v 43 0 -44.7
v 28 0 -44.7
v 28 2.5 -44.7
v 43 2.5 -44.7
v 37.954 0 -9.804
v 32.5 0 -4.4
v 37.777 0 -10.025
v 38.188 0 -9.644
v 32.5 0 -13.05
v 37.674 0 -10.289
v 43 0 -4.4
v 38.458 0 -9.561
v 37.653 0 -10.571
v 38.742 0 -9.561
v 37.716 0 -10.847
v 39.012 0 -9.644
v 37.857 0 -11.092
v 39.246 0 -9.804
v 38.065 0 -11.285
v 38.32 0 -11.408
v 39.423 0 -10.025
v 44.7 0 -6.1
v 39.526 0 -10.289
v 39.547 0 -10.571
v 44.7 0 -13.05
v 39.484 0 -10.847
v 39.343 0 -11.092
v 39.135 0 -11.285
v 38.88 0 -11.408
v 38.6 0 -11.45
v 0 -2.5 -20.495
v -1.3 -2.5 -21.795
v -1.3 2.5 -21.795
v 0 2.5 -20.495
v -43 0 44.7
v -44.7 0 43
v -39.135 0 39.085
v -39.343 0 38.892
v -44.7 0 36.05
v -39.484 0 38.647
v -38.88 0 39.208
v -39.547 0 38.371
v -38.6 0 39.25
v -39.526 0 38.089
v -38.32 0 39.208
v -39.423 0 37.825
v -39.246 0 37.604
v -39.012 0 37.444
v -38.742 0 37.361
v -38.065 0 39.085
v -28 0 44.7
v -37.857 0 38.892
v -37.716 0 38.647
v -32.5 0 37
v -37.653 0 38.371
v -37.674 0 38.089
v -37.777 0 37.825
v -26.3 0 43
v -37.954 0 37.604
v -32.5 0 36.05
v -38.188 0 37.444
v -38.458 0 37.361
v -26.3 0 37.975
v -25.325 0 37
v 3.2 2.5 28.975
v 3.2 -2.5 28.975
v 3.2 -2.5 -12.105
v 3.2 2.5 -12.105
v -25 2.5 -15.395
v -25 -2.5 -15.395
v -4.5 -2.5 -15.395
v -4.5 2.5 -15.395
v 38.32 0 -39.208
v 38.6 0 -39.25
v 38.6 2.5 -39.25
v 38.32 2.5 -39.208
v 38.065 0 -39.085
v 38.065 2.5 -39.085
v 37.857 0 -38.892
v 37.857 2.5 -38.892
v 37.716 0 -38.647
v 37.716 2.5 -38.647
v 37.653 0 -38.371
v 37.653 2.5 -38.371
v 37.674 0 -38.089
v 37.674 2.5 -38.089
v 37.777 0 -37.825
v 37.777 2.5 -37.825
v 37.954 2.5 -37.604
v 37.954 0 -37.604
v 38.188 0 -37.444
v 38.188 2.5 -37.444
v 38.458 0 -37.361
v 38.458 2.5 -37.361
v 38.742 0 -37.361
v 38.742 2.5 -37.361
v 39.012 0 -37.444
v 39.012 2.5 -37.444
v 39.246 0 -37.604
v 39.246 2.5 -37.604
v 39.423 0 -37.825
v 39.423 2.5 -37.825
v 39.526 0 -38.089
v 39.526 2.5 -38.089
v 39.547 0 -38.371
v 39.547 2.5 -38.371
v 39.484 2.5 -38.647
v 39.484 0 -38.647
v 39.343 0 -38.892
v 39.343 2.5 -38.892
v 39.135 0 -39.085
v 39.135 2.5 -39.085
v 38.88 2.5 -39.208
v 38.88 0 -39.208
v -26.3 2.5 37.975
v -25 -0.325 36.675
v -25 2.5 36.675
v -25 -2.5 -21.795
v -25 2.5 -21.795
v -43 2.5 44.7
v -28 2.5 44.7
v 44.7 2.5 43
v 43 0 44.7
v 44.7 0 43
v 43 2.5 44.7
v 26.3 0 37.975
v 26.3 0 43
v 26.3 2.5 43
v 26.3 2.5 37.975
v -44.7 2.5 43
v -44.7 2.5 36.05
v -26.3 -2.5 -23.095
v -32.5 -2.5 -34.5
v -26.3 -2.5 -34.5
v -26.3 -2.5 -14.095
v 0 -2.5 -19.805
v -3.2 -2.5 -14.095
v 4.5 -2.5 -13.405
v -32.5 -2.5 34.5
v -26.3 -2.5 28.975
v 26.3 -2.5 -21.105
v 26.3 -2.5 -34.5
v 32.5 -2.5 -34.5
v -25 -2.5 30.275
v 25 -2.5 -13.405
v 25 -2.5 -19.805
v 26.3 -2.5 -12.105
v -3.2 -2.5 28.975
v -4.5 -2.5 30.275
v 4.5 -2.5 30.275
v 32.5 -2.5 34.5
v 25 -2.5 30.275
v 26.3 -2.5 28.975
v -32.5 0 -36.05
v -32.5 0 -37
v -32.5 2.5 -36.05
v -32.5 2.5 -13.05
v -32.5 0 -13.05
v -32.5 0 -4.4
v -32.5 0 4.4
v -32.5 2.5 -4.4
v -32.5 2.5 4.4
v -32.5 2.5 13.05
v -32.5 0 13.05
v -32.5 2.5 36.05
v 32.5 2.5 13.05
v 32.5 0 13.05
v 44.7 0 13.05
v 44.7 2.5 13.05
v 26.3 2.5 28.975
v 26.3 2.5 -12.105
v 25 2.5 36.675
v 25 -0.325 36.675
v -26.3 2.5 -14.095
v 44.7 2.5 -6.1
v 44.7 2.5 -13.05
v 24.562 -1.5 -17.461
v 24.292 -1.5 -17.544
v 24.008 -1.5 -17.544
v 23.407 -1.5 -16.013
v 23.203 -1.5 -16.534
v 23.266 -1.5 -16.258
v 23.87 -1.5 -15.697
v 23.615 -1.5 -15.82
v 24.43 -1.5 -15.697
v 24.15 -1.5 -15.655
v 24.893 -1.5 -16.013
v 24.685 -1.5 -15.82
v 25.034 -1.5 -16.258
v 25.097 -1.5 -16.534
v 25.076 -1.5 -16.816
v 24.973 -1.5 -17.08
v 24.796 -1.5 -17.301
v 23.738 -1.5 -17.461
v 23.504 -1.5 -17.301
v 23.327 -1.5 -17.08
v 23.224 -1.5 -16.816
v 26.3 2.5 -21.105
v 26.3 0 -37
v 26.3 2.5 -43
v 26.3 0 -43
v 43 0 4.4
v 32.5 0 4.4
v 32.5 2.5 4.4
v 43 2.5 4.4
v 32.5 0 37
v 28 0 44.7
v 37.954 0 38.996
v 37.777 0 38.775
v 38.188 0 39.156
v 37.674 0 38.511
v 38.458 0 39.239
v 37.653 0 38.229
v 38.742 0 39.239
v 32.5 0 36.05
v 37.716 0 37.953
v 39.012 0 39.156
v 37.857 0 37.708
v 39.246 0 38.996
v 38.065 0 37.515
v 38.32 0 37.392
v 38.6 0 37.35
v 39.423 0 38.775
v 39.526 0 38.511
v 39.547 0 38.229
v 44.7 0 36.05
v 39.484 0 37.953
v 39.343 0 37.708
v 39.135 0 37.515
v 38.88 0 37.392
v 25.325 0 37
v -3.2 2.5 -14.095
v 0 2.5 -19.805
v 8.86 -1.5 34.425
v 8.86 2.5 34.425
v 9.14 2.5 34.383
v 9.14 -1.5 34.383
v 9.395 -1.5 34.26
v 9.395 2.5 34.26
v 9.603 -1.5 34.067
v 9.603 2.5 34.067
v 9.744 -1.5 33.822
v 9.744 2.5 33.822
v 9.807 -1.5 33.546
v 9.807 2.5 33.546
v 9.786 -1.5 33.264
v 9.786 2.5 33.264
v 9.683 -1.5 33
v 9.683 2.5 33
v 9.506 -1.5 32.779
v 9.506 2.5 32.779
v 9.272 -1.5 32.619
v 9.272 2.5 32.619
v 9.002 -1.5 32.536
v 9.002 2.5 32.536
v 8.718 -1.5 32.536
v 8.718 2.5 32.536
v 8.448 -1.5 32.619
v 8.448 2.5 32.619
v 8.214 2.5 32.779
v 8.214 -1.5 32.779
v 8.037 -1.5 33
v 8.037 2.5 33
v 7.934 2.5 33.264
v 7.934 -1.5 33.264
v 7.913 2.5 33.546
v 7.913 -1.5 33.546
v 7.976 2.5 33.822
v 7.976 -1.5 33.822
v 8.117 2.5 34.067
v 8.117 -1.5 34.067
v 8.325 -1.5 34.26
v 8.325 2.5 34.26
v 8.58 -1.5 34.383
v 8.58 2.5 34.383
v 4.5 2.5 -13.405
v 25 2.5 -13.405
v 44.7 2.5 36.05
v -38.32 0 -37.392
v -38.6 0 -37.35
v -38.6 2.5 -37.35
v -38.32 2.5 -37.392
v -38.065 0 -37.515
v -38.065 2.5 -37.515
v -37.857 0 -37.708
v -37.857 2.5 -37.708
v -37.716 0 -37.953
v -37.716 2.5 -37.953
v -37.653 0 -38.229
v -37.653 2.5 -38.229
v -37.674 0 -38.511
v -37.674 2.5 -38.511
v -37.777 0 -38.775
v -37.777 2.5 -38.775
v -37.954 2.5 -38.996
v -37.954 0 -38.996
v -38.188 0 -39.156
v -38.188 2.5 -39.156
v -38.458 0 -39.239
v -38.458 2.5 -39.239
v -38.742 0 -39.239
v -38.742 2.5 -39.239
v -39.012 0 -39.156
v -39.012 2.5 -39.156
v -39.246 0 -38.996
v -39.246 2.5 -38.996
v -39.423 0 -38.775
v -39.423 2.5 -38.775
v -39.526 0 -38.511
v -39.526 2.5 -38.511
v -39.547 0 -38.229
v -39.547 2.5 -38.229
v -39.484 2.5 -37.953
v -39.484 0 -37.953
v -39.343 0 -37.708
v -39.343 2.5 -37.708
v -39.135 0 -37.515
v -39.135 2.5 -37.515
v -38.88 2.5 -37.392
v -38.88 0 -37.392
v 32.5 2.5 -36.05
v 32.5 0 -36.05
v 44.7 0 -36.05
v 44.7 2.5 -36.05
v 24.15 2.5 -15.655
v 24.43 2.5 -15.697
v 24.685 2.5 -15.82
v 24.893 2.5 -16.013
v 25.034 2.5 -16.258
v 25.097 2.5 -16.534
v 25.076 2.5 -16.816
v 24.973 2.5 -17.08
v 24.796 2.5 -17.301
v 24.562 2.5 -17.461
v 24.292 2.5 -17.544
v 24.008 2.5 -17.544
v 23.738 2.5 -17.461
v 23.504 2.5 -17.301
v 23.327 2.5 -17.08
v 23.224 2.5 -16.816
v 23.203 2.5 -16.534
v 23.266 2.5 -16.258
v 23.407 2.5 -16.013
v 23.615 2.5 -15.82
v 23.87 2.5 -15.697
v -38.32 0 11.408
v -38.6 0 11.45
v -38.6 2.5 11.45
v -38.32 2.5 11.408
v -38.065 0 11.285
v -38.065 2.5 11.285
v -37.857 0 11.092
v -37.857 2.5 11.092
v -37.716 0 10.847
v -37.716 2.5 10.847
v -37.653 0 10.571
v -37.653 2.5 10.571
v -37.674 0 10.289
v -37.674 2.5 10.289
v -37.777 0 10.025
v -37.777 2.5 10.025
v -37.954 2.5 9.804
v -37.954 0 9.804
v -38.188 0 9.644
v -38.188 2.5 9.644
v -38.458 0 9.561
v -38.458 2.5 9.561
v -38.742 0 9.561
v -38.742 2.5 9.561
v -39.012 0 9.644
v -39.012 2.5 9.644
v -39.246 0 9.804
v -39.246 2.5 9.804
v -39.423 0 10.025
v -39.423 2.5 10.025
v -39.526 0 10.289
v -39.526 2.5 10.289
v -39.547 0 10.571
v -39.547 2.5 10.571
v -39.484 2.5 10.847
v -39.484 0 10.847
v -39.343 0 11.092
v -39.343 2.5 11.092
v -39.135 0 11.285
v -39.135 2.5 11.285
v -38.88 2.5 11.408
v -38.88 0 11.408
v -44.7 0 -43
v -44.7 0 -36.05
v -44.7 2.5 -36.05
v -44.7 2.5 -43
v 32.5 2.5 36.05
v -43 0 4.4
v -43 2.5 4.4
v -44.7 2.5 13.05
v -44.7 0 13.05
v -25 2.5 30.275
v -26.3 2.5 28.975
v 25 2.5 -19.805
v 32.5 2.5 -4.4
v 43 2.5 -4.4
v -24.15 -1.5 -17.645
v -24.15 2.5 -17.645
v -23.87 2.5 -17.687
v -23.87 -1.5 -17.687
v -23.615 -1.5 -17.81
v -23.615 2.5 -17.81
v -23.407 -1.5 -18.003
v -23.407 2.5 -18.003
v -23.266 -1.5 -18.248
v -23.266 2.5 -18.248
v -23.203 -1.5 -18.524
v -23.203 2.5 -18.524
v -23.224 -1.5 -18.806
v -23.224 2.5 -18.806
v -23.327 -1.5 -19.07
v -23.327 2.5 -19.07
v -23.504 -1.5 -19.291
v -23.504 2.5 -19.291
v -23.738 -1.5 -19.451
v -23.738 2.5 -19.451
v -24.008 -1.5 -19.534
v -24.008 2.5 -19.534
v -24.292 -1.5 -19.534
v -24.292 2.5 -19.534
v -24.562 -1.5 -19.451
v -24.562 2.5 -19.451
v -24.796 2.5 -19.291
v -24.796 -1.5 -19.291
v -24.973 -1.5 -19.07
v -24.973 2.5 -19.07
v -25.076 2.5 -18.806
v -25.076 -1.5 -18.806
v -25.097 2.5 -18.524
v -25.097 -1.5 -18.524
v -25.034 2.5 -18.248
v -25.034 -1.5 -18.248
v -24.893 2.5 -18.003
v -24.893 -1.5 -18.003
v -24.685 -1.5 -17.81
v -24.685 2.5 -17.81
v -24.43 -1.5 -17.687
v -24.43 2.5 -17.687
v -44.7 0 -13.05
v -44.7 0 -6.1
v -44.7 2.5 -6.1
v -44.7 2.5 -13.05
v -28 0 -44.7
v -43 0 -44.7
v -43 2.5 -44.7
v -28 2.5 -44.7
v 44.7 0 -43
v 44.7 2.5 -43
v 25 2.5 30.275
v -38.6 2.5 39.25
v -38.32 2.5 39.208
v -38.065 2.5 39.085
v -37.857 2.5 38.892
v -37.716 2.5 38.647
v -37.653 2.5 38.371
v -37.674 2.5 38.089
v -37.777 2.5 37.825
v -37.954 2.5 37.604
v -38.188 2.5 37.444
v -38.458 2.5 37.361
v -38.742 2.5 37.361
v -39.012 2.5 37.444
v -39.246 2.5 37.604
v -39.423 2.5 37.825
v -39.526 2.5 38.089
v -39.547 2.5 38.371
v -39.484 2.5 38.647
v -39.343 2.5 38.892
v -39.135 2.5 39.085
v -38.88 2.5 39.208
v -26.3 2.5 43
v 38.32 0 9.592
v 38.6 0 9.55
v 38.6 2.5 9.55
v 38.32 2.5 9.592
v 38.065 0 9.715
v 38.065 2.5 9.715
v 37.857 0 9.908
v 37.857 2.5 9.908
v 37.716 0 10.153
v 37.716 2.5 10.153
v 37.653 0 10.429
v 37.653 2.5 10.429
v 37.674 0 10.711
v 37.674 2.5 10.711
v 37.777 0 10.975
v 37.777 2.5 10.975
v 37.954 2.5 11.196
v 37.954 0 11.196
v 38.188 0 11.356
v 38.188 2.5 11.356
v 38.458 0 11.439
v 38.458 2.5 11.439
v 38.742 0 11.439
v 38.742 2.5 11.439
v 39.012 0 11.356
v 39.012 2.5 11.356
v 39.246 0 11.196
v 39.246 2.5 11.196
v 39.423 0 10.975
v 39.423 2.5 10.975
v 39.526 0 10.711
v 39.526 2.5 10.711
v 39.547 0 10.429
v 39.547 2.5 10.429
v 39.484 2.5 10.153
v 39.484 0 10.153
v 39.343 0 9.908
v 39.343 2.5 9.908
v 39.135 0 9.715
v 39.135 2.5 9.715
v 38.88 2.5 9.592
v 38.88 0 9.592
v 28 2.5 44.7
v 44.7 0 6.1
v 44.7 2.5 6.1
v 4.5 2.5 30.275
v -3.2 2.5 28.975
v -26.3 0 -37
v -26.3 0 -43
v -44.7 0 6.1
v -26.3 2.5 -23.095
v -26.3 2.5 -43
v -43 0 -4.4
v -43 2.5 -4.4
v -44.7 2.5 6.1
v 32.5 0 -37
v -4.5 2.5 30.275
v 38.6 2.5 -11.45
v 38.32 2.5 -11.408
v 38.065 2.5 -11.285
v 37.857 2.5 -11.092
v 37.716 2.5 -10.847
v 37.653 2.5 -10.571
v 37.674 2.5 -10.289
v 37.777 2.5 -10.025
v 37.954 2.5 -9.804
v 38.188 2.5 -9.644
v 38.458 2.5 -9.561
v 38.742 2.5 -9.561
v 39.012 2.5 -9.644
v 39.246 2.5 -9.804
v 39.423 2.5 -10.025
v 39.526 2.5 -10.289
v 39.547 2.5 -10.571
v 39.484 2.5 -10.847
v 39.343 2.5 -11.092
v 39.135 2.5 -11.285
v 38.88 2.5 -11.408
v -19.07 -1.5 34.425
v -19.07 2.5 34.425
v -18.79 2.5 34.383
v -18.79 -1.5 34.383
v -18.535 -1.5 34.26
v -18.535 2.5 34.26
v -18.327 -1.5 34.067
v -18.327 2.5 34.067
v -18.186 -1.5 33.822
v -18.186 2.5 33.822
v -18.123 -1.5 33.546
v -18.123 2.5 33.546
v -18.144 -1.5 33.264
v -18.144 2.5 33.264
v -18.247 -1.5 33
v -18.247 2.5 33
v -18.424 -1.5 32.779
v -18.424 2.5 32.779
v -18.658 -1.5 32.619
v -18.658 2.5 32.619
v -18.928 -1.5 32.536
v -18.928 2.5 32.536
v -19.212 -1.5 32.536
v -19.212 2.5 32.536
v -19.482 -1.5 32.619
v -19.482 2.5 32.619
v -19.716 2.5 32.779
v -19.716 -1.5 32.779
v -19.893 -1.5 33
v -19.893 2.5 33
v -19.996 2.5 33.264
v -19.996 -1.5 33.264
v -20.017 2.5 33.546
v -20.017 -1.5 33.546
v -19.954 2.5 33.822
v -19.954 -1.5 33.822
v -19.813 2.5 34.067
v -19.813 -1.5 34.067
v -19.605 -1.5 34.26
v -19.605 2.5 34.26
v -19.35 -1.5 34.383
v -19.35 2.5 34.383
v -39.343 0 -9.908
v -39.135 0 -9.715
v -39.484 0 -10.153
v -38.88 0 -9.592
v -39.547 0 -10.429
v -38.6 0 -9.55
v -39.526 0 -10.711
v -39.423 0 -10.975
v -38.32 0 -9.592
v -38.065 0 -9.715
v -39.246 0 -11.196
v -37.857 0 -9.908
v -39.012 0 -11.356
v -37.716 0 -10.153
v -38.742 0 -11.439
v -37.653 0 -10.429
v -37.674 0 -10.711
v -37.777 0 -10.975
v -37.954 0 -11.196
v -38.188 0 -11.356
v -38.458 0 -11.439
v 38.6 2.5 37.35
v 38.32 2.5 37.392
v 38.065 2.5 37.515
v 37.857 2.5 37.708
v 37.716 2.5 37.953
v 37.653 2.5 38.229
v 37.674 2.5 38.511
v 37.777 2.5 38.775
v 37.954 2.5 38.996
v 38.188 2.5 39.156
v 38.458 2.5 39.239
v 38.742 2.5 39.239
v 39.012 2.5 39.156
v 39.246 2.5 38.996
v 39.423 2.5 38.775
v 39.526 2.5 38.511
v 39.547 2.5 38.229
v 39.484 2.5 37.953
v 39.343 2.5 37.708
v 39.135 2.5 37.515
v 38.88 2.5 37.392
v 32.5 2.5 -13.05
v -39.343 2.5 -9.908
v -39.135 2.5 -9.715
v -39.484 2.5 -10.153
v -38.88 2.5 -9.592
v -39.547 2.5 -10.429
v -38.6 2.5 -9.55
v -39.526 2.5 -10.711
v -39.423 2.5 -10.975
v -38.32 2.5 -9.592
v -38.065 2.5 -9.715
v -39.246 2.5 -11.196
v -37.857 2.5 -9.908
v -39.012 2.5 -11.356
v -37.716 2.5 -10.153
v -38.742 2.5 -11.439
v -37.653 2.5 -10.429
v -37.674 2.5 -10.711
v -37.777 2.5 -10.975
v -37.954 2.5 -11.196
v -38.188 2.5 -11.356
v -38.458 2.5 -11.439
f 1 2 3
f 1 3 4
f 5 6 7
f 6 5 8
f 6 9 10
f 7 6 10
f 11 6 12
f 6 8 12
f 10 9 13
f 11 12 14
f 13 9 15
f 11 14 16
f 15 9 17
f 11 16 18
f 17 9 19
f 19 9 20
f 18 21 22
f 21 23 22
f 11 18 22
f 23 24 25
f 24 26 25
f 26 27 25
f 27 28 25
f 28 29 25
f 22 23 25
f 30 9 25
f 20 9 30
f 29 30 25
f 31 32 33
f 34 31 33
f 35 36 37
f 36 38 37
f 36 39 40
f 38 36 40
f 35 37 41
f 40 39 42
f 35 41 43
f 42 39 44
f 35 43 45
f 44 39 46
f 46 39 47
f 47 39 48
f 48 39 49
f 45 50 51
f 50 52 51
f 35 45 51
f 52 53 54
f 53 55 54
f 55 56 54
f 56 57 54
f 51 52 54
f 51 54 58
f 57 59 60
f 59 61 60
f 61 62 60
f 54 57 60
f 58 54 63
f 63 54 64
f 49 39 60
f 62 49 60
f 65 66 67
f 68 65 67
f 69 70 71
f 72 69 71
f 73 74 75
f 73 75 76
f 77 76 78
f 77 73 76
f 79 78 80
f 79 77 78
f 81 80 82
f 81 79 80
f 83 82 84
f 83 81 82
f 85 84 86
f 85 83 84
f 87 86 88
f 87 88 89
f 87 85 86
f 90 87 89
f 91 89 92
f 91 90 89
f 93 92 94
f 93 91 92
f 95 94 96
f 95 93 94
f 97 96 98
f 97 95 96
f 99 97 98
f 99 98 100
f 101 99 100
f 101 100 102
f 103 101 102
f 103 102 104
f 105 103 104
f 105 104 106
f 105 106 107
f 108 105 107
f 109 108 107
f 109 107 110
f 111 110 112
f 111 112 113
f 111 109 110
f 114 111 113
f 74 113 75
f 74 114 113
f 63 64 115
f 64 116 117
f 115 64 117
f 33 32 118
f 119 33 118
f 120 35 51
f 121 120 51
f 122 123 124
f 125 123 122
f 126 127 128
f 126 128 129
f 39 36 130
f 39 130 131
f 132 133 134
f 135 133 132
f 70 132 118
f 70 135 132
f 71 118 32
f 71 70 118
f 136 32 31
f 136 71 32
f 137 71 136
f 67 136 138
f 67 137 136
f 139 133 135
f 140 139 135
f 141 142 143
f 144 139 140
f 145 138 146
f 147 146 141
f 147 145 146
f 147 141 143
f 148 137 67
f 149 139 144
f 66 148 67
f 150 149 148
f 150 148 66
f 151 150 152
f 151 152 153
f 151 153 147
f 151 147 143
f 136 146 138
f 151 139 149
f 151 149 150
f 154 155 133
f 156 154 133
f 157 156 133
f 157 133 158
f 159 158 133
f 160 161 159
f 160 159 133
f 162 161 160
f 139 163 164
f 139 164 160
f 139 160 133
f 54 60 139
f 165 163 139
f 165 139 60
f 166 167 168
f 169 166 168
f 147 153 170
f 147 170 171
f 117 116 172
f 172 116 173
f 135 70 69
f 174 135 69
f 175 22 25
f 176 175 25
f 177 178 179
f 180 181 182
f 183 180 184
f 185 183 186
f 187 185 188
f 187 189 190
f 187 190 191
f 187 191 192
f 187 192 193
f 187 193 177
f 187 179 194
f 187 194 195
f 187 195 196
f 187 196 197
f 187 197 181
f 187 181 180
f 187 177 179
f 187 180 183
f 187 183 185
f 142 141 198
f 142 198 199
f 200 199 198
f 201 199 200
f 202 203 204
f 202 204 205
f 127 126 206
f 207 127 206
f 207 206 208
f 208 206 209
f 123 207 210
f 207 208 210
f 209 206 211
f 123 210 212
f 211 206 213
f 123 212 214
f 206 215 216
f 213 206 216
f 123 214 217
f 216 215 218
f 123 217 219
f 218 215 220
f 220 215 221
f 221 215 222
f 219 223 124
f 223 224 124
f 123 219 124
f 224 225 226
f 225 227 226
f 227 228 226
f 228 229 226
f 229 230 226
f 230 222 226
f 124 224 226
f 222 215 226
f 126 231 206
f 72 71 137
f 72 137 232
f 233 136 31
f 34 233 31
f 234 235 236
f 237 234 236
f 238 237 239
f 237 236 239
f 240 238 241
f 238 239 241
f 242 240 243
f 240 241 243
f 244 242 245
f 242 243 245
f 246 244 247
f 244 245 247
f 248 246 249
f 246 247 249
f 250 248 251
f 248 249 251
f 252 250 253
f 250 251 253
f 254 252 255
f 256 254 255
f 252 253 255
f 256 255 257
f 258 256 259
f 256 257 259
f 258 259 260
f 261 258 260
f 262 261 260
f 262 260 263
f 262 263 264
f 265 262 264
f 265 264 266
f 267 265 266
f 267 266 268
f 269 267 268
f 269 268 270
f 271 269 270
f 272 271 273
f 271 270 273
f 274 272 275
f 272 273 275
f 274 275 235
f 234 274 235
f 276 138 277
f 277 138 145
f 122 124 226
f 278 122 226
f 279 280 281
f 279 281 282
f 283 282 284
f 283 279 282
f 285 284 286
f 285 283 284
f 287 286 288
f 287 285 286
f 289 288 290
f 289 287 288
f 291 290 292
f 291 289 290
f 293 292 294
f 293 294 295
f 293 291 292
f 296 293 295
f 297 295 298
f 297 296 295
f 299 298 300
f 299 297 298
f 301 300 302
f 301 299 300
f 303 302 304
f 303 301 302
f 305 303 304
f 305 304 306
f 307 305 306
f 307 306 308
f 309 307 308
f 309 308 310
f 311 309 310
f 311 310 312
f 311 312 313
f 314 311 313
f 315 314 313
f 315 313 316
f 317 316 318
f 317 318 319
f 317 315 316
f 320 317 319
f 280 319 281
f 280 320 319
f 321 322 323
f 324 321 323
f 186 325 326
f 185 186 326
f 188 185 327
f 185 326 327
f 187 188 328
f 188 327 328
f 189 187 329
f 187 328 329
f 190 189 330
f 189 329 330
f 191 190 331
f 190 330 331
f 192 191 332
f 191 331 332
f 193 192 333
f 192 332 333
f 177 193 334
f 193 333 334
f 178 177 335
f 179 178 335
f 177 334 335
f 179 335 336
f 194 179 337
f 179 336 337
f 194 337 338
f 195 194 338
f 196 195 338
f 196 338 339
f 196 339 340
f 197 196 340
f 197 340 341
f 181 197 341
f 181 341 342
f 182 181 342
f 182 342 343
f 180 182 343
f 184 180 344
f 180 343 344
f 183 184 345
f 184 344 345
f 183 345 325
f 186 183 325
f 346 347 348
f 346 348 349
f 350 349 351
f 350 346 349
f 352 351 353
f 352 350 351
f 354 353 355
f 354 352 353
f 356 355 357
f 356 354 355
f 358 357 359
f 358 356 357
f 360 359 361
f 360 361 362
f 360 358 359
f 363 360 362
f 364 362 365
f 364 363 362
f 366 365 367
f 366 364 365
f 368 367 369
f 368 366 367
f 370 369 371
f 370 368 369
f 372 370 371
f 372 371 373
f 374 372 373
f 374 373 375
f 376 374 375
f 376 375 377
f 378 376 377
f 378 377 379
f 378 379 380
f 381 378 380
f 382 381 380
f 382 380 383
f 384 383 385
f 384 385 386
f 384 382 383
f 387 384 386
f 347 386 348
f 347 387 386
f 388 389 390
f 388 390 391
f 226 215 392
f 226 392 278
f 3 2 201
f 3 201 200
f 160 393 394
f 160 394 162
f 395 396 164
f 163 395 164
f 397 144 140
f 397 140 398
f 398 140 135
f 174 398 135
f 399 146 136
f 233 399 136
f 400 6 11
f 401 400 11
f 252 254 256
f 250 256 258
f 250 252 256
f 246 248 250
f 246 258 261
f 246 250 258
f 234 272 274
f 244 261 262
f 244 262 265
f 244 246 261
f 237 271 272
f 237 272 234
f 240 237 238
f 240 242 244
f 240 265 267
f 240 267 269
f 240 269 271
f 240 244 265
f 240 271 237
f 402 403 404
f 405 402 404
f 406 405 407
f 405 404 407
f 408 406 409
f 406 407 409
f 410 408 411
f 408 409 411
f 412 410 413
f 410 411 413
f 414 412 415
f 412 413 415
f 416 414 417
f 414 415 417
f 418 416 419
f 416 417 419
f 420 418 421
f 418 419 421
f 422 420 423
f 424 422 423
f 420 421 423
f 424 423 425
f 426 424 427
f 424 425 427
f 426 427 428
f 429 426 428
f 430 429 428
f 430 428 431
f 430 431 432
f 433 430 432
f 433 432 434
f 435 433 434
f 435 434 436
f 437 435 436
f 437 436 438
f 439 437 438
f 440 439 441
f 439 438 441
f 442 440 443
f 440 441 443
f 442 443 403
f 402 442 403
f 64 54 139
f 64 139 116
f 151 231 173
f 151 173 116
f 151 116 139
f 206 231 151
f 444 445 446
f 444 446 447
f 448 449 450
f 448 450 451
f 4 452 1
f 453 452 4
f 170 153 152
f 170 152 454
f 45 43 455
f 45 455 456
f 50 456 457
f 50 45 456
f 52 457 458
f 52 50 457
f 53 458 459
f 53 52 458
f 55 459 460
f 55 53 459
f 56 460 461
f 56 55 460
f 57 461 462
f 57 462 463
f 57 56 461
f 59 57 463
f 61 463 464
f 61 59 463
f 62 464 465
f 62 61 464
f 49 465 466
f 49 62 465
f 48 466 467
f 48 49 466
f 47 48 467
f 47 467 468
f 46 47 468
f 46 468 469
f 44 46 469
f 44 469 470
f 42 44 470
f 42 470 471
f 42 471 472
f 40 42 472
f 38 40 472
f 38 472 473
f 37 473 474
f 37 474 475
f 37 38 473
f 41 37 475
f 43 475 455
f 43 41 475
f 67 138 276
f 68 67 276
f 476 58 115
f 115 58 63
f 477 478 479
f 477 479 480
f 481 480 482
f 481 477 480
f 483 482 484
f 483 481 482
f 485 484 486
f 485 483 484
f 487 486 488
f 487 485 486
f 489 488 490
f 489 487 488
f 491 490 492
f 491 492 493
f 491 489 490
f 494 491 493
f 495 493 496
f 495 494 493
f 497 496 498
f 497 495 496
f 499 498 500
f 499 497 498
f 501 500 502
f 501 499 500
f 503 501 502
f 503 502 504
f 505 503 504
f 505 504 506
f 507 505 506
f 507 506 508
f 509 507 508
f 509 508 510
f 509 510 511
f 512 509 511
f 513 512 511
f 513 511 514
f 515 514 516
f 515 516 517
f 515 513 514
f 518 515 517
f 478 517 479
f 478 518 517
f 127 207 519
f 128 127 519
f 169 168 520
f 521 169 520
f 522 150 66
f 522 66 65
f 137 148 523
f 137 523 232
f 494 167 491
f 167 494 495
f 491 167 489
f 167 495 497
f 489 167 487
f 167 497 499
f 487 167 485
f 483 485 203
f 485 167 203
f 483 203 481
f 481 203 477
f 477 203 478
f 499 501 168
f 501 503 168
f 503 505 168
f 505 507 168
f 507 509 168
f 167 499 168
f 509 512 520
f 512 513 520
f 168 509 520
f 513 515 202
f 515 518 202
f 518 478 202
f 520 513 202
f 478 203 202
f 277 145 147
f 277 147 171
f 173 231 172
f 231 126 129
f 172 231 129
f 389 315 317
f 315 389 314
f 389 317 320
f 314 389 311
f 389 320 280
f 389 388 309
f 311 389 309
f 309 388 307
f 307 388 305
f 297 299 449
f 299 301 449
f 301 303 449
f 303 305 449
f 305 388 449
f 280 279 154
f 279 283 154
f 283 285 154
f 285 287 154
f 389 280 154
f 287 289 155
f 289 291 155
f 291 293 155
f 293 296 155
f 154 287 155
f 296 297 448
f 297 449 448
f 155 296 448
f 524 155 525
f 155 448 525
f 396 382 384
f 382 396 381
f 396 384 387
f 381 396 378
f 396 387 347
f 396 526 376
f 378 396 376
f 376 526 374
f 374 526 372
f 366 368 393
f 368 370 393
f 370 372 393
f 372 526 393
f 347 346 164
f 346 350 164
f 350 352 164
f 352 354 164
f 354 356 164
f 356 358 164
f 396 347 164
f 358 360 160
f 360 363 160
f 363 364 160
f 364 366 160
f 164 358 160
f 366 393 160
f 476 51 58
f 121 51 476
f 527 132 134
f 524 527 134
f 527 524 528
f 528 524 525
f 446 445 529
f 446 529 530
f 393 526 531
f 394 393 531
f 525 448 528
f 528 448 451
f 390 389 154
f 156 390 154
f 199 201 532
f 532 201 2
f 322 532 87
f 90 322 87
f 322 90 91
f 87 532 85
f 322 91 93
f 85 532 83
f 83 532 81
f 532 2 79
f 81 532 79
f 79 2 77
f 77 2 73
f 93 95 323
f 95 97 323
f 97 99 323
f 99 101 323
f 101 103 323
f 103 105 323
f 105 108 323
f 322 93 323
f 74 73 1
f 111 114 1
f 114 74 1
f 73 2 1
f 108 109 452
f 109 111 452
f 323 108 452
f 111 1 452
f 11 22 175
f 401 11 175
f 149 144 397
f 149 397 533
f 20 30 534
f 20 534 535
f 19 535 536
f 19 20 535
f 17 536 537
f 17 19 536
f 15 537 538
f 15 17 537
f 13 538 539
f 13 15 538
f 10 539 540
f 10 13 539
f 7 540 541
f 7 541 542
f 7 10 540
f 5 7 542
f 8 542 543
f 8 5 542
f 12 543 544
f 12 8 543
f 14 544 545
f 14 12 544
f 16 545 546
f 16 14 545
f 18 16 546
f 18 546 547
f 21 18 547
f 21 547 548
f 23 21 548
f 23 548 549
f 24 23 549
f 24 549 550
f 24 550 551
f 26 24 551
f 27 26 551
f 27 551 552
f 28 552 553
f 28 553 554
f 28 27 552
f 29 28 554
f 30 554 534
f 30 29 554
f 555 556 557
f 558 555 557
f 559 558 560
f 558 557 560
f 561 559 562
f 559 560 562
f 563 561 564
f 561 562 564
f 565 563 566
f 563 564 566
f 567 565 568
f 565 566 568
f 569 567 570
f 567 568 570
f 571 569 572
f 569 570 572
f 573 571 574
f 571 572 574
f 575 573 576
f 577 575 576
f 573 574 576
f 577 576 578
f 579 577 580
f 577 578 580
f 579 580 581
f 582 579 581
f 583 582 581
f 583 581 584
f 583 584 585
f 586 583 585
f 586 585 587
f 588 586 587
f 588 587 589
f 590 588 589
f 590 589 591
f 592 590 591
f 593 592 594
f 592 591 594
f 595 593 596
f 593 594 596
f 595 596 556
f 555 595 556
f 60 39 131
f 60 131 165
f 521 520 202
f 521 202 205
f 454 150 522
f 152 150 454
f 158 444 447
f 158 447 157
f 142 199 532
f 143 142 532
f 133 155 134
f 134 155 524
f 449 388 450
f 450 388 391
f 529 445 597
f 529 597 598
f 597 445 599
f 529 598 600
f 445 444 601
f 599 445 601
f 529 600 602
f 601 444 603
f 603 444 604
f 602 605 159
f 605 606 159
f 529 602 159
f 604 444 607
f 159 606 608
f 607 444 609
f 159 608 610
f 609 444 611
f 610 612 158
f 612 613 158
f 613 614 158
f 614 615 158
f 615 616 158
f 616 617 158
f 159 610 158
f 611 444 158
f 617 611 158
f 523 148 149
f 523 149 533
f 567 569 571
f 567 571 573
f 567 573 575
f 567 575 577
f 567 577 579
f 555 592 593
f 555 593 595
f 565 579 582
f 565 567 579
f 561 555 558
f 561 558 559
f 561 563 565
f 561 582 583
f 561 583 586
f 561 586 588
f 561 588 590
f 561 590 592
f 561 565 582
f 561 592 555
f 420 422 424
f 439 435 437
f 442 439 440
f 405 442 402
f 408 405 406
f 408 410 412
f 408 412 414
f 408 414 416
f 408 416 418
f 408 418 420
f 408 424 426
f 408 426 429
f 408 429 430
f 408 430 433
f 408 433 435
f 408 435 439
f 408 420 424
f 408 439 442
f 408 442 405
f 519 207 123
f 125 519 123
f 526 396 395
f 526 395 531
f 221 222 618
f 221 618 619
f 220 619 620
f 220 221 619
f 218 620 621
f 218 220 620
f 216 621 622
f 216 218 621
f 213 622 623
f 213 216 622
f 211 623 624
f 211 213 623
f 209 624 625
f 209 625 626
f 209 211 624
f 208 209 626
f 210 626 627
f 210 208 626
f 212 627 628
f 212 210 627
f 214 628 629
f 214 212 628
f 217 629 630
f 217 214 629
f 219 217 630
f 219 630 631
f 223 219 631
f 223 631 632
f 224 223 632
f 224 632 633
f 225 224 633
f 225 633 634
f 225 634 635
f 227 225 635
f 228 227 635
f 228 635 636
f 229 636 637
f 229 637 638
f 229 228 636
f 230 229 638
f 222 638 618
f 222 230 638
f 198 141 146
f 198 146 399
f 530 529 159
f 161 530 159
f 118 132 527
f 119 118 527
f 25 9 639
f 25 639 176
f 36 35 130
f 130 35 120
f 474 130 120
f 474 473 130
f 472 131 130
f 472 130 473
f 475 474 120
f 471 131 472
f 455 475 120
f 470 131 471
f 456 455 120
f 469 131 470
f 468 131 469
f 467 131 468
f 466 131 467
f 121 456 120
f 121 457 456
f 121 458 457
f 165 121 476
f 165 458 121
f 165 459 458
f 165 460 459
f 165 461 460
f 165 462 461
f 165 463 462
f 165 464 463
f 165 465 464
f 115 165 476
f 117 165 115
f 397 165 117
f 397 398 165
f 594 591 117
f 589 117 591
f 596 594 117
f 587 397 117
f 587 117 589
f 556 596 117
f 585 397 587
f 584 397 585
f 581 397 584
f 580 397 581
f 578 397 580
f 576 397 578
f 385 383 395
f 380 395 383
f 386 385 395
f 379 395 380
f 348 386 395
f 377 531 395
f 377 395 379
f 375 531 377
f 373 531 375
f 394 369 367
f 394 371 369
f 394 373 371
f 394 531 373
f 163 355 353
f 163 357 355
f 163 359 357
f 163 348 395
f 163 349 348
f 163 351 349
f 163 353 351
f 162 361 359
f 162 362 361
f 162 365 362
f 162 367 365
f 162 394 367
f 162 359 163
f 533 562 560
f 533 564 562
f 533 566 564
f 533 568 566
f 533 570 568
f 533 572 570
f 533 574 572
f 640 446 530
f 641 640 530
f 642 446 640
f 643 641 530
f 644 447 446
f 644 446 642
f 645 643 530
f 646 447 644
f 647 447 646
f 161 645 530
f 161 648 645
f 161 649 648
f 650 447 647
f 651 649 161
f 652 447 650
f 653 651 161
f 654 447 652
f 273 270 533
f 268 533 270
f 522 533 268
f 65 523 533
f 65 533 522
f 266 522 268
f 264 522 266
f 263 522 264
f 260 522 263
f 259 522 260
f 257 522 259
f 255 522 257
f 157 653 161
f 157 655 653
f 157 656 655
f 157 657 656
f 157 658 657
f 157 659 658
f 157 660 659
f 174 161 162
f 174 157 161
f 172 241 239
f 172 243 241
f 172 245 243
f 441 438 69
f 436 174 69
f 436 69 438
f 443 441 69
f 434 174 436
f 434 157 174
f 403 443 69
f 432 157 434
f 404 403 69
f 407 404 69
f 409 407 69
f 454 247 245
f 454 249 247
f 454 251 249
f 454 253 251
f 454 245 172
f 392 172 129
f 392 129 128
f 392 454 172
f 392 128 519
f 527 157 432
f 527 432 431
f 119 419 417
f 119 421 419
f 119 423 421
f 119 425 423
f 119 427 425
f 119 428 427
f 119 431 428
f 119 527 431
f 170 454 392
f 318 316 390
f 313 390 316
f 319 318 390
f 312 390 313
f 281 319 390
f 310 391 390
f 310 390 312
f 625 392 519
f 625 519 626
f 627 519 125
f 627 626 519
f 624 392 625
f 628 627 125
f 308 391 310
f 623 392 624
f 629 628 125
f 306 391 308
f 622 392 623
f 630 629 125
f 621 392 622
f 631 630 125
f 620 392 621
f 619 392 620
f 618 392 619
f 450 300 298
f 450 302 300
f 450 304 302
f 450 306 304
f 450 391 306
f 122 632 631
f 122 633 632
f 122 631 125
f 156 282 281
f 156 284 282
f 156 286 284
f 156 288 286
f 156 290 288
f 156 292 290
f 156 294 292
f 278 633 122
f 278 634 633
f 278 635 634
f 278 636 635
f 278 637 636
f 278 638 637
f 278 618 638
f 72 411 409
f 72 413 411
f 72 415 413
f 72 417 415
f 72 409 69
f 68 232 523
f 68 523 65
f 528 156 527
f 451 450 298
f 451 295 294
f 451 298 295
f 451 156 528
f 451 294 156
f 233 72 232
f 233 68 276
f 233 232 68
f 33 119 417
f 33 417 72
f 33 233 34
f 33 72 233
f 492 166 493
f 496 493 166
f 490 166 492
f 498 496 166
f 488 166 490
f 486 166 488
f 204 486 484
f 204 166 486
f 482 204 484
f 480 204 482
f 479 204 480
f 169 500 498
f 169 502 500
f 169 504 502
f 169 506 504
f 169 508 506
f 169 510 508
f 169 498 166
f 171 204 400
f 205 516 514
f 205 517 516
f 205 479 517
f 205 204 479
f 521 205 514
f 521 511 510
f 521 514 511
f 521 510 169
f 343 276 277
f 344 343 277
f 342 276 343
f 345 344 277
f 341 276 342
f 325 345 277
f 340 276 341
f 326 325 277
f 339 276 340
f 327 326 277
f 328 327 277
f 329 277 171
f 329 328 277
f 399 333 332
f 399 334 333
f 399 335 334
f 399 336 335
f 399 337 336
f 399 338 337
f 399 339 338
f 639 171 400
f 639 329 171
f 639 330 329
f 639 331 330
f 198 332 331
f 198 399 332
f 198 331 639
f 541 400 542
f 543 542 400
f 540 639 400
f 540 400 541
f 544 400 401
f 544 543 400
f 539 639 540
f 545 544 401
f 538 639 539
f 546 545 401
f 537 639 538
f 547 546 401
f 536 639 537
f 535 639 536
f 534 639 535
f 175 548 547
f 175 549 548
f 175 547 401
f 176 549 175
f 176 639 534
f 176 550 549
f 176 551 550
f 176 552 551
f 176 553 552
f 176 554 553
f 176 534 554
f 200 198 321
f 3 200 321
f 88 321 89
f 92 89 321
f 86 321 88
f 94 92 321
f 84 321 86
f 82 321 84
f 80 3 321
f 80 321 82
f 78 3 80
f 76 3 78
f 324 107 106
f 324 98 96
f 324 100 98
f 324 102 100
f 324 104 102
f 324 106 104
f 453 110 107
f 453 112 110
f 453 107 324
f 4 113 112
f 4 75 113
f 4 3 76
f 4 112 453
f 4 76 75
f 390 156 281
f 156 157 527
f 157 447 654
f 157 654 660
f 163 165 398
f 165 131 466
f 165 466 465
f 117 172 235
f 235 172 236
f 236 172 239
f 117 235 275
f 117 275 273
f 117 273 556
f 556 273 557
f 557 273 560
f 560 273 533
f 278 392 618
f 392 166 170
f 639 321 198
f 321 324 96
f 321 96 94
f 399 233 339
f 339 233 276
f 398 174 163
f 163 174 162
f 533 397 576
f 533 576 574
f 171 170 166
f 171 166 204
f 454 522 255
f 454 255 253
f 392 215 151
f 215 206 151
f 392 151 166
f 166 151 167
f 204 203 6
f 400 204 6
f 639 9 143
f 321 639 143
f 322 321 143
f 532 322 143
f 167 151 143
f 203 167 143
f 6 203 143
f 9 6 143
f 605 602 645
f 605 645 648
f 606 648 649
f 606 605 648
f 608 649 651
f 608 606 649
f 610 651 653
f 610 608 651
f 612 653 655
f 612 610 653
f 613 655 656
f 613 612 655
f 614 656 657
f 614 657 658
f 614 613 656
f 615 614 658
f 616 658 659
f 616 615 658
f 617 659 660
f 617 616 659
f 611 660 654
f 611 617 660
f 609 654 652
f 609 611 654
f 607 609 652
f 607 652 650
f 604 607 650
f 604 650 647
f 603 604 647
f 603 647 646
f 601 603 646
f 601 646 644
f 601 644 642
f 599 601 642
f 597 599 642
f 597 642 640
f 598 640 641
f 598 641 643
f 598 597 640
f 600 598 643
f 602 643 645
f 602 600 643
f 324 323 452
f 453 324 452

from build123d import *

# Parameters (mm, degrees)
SKETCH1_W               = 89.4
SKETCH1_H               = 89.4
SKETCH1_R               = 0.95
BOSS_EXTRUDE1_DEPTH     = 2.5
SKETCH5_W               = 65
SKETCH5_H               = 74
BOSS_EXTRUDE3_DEPTH     = 2.5
SKETCH7_R               = 0.95
CUT_EXTRUDE2_DEPTH      = 4
CUT_EXTRUDE1_DEPTH      = 64.412774738
CUT_EXTRUDE1_DEPTH_BACK = 64.412774738
SKETCH2_W               = 12.2
SKETCH2_H               = 23
SKETCH2_W_2             = 52.6
SKETCH2_H_2             = 8.025
SKETCH2_W_3             = 23.1
SKETCH2_H_3             = 45.67
SKETCH2_H_4             = 43.68
SKETCH2_H_5             = 8.8
CHAMFER2_SIZE           = 1.3
CHAMFER3_SIZE           = 1.3
CHAMFER4_SIZE           = 1.7
CHAMFER5_SIZE           = 2.5


with BuildPart() as part:
    # Sketch1 → Boss-Extrude1 (new body)
    with BuildSketch(Plane(origin=(0, 0, 0), x_dir=(1, 0, 0), z_dir=(0, 1, 0))):
        Rectangle(SKETCH1_W, SKETCH1_H)
        with Locations(Location((-38.6, 38.3, 0), (0, 0, 270))):
            Circle(SKETCH1_R, mode=Mode.SUBTRACT)
        with Locations(Location((-38.6, 10.5, 0), (0, 0, 270))):
            Circle(SKETCH1_R, mode=Mode.SUBTRACT)
        with Locations(Location((-38.6, -10.5, 0), (0, 0, 270))):
            Circle(SKETCH1_R, mode=Mode.SUBTRACT)
        with Locations(Location((-38.6, -38.3, 0), (0, 0, 270))):
            Circle(SKETCH1_R, mode=Mode.SUBTRACT)
        with Locations(Location((38.6, -38.3, 0), (0, 0, 90))):
            Circle(SKETCH1_R, mode=Mode.SUBTRACT)
        with Locations(Location((38.6, -10.5, 0), (0, 0, 90))):
            Circle(SKETCH1_R, mode=Mode.SUBTRACT)
        with Locations(Location((38.6, 10.5, 0), (0, 0, 90))):
            Circle(SKETCH1_R, mode=Mode.SUBTRACT)
        with Locations(Location((38.6, 38.3, 0), (0, 0, 90))):
            Circle(SKETCH1_R, mode=Mode.SUBTRACT)
    extrude(amount=BOSS_EXTRUDE1_DEPTH)

    # Sketch5 → Boss-Extrude3 (add)
    with BuildSketch(Plane.XZ):
        Rectangle(SKETCH5_W, SKETCH5_H)
    extrude(amount=BOSS_EXTRUDE3_DEPTH)

    # Sketch7 → Cut-Extrude2 (cut)
    with BuildSketch(Plane(origin=(0, 2.5, 0), x_dir=(1, 0, 0), z_dir=(0, 1, 0))):
        with Locations(Location((-24.15, 18.595, 0), (0, 0, 270))):
            Circle(SKETCH7_R)
        with Locations(Location((24.15, 16.605, 0), (0, 0, 270))):
            Circle(SKETCH7_R)
        with Locations(Location((-19.07, -33.475, 0), (0, 0, 270))):
            Circle(SKETCH7_R)
        with Locations(Location((8.86, -33.475, 0), (0, 0, 270))):
            Circle(SKETCH7_R)
    extrude(amount=-CUT_EXTRUDE2_DEPTH, mode=Mode.SUBTRACT)

    # Sketch2 → Cut-Extrude1 (cut, two sides: drawn at the far end of the back side and taken through both)
    with BuildSketch(Plane(origin=(0, 2.5, 0), x_dir=(1, 0, 0), z_dir=(0, 1, 0)).offset(-CUT_EXTRUDE1_DEPTH_BACK)):
        with Locations((-38.6, 24.55)):
            Rectangle(SKETCH2_W, SKETCH2_H)
        Polygon((-26.3, 44.7), (26.3, 44.7), (26.3, 24.23), (26.3, 19.805), (0, 19.805), (0, 21.795), (-26.3, 21.795), align=None)
        with Locations((0, -40.6875)):
            Rectangle(SKETCH2_W_2, SKETCH2_H_2)
        with Locations((-14.75, -7.44)):
            Rectangle(SKETCH2_W_3, SKETCH2_H_3)
        with Locations((14.75, -8.435)):
            Rectangle(SKETCH2_W_3, SKETCH2_H_4)
        with Locations((-38.6, 0)):
            Rectangle(SKETCH2_W, SKETCH2_H_5)
        with Locations((38.6, 0)):
            Rectangle(SKETCH2_W, SKETCH2_H_5)
        with Locations((38.6, 24.55)):
            Rectangle(SKETCH2_W, SKETCH2_H)
        with Locations((38.6, -24.55)):
            Rectangle(SKETCH2_W, SKETCH2_H)
        with Locations((-38.6, -24.55)):
            Rectangle(SKETCH2_W, SKETCH2_H)
    extrude(amount=CUT_EXTRUDE1_DEPTH + CUT_EXTRUDE1_DEPTH_BACK, mode=Mode.SUBTRACT)

    # Chamfer2
    chamfer2_edges = [part.edges().sort_by_distance(p)[0] for p in [
        (0, 0, -21.795),
    ]]
    chamfer(chamfer2_edges, length=CHAMFER2_SIZE)

    # Chamfer3
    chamfer3_edges = [part.edges().sort_by_distance(p)[0] for p in [
        (-26.3, 0, -21.795),
        (26.3, 0, 36.675),
        (-26.3, 0, 36.675),
        (-26.3, 0, 30.275),
        (-3.2, 0, 30.275),
        (3.2, 0, 30.275),
        (26.3, 0, 30.275),
        (-3.2, 0, -15.395),
        (3.2, 0, -13.405),
        (26.3, 0, -13.405),
        (26.3, 0, -19.805),
        (-26.3, 0, -15.395),
    ]]
    chamfer(chamfer3_edges, length=CHAMFER3_SIZE)

    # Chamfer4
    chamfer4_edges = [part.edges().sort_by_distance(p)[0] for p in [
        (26.3, 1.25, 44.7),
        (-26.3, 1.25, 44.7),
        (-44.7, 1.25, 4.4),
        (-44.7, 1.25, -4.4),
        (-26.3, 1.25, -44.7),
        (26.3, 1.25, -44.7),
        (44.7, 1.25, -4.4),
        (44.7, 1.25, 4.4),
        (-44.7, 1.25, -44.7),
        (44.7, 1.25, -44.7),
        (44.7, 1.25, 44.7),
        (-44.7, 1.25, 44.7),
    ]]
    chamfer(chamfer4_edges, length=CHAMFER4_SIZE)

    # Chamfer5
    chamfer5_edges = [part.edges().sort_by_distance(p)[0] for p in [
        (28.9125, -2.5, 37),
        (29.4, -2.5, -37),
        (-29.4, -2.5, -37),
    ]]
    chamfer(chamfer5_edges, length=CHAMFER5_SIZE - 0.0001)  # a hair under: the kernel refuses the full size


solid = part.part
